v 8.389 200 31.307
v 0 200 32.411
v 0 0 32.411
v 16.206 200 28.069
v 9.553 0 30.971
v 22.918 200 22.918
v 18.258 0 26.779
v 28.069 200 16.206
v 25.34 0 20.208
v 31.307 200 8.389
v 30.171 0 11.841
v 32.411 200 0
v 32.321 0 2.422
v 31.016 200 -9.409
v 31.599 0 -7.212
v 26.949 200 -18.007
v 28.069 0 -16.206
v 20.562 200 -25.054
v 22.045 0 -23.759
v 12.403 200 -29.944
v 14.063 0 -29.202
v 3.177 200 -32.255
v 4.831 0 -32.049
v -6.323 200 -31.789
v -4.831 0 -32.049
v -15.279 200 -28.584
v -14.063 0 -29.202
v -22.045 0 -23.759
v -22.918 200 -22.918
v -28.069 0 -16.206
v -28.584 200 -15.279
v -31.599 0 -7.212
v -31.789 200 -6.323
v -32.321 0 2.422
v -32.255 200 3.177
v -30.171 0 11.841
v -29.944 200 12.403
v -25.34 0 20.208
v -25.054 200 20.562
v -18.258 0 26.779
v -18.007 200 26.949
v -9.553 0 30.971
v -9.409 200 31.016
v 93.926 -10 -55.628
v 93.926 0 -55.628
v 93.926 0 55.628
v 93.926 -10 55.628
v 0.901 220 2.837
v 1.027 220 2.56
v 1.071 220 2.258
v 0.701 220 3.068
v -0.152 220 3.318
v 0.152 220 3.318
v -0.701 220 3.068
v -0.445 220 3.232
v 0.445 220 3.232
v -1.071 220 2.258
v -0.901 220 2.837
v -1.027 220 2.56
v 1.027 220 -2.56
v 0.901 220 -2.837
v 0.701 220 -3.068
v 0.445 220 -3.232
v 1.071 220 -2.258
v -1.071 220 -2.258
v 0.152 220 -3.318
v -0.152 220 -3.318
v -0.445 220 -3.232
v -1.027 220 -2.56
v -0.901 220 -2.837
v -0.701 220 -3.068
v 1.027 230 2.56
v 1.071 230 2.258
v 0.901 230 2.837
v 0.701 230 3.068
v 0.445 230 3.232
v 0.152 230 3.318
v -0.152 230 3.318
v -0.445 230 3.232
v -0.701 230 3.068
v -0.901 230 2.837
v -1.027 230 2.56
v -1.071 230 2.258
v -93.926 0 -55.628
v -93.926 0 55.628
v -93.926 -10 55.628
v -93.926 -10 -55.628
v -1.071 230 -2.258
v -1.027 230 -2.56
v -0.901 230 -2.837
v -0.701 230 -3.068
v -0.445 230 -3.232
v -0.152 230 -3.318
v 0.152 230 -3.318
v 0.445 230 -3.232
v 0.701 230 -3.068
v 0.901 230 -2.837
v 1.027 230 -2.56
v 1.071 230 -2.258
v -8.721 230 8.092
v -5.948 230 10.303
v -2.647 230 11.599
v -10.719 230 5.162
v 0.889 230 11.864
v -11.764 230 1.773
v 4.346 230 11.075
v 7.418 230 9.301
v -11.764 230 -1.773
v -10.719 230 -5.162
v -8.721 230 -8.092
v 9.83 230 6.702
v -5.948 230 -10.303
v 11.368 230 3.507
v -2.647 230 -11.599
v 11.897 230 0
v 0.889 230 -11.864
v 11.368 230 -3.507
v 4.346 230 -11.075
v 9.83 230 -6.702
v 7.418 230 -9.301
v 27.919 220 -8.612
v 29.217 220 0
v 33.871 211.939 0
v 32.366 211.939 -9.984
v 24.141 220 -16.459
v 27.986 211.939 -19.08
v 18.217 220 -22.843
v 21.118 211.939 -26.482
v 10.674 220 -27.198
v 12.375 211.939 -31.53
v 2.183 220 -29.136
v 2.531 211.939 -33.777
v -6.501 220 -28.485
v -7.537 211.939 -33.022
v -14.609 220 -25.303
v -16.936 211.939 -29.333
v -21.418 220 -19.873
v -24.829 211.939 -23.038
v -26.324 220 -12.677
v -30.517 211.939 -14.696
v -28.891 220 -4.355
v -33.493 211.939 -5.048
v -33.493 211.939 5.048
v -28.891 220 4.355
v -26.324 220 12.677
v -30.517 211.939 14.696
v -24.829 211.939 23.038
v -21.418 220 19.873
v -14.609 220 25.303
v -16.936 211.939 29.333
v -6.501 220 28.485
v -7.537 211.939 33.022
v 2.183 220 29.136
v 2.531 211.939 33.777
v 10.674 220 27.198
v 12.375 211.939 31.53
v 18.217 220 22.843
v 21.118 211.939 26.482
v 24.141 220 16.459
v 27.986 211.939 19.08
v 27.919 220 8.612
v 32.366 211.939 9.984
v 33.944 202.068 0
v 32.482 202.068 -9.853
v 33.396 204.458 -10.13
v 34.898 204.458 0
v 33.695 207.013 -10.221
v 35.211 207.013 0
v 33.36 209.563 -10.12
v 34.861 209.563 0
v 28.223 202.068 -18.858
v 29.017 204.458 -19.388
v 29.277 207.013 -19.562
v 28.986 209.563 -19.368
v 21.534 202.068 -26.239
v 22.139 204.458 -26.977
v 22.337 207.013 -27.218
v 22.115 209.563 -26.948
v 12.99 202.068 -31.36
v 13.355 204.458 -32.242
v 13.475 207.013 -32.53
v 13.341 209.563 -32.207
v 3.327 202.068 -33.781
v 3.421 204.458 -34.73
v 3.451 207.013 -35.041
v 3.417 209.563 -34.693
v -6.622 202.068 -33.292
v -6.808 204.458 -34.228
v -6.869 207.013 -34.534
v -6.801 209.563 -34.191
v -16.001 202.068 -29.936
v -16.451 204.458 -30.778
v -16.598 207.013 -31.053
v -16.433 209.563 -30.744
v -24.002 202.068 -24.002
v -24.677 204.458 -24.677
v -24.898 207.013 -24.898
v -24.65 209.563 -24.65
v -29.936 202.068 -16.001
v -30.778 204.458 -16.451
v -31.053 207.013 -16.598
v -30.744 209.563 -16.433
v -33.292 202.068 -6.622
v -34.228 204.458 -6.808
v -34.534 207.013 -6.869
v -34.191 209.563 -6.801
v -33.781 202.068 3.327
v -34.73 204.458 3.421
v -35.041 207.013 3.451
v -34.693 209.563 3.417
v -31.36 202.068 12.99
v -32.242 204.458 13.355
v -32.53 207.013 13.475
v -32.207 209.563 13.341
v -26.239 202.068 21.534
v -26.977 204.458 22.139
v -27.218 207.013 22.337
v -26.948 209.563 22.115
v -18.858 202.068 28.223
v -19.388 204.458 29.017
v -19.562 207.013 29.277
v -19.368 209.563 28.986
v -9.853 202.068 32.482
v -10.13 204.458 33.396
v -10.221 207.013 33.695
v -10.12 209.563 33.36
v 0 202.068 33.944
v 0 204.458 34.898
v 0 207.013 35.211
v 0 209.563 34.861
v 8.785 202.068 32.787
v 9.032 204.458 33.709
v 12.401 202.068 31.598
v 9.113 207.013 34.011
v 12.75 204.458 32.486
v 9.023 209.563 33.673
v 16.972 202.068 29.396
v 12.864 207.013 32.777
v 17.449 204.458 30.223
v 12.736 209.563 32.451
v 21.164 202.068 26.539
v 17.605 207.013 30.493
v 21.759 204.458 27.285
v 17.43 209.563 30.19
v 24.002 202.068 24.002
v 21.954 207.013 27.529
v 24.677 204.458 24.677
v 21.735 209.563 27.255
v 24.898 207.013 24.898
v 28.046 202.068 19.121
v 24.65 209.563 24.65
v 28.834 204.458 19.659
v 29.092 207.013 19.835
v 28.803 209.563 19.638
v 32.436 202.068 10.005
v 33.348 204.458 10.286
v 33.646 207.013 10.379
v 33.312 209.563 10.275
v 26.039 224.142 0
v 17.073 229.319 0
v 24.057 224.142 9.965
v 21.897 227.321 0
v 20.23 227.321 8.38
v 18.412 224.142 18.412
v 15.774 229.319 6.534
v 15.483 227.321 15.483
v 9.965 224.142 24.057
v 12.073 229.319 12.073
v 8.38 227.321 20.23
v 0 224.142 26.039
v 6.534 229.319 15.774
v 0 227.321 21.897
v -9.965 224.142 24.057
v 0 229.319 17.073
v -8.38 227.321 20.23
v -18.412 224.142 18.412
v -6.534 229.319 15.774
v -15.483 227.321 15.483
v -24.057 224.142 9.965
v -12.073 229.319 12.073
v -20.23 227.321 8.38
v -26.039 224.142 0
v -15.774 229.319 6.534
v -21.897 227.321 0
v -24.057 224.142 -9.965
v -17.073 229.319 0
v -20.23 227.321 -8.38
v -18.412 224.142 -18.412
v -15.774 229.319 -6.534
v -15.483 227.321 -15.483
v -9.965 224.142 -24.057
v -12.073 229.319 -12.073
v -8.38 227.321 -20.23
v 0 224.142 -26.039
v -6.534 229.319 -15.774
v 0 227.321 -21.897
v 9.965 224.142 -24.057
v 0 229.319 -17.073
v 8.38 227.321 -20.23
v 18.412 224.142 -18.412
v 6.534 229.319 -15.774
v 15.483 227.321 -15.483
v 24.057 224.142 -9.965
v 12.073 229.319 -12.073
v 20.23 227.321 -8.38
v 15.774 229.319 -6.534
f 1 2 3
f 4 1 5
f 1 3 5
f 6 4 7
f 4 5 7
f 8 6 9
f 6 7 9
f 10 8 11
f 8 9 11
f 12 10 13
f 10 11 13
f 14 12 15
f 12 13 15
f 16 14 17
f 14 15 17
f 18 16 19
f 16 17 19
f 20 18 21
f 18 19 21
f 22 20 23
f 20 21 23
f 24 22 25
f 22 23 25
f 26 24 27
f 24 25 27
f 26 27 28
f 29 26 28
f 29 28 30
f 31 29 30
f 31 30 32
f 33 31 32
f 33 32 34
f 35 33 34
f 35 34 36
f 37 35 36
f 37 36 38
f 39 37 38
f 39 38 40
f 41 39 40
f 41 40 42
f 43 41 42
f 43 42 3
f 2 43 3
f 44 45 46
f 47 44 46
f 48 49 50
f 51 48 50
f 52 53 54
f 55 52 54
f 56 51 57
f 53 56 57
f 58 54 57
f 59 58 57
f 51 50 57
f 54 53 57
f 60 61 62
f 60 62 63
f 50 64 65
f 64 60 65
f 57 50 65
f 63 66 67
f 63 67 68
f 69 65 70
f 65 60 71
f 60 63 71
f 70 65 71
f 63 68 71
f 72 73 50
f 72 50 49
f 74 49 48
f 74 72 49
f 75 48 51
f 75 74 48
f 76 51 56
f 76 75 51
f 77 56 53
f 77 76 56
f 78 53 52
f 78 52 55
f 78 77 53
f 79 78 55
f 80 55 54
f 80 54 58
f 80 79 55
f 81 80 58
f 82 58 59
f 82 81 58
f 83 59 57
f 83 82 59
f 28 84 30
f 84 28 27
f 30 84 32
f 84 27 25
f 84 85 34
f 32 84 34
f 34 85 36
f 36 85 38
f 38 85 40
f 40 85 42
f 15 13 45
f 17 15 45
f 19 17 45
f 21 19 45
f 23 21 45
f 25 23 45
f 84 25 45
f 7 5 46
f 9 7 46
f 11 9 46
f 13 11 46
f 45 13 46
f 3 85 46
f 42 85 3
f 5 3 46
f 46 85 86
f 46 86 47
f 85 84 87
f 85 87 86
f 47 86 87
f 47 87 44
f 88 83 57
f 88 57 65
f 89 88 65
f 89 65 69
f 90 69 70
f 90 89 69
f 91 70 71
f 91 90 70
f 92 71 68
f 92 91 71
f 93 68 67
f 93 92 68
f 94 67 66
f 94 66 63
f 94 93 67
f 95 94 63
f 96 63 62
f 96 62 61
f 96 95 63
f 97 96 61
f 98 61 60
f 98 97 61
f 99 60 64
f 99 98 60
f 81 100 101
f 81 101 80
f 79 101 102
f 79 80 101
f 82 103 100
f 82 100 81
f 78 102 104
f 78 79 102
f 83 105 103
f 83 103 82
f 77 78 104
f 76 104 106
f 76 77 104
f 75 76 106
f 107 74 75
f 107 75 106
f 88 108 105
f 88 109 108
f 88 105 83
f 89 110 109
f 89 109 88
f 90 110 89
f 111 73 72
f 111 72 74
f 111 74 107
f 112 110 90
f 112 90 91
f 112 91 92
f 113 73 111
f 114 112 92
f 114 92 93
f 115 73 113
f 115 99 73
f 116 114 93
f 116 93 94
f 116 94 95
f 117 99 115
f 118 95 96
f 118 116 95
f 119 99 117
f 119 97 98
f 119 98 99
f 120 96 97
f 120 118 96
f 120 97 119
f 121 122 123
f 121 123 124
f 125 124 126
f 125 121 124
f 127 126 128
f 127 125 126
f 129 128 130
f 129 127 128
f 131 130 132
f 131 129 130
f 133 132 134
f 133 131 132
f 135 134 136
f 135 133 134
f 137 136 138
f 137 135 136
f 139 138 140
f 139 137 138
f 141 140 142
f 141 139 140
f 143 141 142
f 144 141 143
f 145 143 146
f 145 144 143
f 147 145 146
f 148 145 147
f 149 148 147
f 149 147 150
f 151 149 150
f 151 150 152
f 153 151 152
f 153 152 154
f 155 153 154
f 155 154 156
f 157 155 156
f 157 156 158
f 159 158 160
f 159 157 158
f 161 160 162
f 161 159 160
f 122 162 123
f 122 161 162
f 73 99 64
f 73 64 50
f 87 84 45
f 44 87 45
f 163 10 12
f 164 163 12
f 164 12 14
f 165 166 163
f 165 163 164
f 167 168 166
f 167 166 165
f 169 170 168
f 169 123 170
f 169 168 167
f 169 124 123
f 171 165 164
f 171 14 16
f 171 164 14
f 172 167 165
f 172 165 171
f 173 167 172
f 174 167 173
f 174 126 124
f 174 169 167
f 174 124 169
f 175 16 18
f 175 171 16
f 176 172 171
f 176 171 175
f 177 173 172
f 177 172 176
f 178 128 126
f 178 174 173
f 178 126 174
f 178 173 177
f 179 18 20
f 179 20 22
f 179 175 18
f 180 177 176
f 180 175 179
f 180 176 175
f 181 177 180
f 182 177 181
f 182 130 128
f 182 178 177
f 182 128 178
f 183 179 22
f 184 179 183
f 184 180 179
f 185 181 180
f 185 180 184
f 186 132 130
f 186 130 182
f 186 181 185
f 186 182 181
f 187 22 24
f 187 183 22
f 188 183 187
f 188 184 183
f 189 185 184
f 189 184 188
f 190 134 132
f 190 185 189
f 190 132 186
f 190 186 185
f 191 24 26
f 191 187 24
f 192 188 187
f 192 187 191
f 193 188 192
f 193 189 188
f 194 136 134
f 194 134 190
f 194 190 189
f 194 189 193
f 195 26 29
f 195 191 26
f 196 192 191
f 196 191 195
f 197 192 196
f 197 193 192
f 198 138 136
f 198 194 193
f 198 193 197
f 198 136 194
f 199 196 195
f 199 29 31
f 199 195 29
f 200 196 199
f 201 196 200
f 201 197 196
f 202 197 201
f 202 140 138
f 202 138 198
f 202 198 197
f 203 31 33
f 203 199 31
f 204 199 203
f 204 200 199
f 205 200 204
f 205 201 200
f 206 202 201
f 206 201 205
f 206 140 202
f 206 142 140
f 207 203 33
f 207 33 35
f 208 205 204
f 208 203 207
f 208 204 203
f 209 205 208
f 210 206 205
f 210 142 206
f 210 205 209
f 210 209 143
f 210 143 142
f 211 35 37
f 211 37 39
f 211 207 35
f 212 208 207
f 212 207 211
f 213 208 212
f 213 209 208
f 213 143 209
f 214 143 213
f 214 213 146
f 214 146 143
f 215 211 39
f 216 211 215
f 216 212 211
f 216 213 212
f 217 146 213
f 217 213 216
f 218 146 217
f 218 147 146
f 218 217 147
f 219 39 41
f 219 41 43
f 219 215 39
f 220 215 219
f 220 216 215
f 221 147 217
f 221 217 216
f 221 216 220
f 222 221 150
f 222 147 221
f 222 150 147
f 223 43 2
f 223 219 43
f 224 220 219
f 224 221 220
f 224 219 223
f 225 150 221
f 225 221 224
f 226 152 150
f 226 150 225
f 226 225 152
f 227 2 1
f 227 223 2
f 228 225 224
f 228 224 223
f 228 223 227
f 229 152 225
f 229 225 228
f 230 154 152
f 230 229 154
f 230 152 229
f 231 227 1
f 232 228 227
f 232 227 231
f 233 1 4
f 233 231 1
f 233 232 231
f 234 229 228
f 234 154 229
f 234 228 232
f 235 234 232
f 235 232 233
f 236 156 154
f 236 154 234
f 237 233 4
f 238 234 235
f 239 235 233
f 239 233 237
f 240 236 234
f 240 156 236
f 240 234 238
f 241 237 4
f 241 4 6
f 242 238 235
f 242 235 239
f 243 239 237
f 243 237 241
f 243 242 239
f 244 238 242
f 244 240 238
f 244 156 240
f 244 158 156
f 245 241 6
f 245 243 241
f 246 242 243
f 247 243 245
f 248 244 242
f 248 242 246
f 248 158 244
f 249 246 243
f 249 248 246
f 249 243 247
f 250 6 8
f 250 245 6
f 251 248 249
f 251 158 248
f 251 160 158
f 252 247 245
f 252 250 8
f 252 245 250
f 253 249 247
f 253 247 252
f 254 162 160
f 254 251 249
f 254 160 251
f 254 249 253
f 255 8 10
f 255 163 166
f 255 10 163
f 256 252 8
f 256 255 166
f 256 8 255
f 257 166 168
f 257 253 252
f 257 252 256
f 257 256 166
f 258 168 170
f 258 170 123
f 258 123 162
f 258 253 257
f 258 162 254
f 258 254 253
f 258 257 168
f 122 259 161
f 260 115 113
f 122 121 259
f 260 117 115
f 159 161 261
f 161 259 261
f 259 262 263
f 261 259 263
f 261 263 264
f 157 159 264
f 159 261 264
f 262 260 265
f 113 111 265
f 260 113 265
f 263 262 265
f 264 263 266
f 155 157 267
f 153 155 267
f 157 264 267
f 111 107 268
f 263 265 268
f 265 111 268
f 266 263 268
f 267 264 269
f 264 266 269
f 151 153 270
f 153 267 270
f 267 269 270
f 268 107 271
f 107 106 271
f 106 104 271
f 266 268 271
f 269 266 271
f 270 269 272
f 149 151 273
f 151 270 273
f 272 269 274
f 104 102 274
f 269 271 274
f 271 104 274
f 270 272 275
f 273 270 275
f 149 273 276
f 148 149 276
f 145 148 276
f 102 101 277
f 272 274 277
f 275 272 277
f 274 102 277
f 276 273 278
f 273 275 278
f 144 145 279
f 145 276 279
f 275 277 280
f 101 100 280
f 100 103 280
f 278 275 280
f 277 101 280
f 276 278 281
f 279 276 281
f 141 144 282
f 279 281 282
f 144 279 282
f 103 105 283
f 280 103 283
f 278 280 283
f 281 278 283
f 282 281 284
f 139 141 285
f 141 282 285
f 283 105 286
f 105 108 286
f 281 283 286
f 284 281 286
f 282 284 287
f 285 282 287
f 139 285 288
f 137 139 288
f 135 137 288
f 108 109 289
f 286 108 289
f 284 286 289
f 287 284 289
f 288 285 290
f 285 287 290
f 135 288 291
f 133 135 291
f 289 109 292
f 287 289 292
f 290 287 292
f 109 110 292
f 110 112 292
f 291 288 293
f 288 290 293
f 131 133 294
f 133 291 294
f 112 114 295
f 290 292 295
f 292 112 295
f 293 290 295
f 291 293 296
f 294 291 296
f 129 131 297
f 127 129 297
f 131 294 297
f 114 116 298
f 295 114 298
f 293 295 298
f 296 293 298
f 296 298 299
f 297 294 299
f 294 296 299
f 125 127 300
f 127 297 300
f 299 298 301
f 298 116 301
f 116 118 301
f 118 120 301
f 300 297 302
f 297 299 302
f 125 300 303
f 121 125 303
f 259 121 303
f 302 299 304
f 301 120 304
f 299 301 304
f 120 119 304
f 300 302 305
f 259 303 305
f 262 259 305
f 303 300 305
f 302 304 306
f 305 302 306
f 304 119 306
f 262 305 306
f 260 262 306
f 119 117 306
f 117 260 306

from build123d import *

# Parameters (mm, degrees)
SKETCH2_R           = 32.411320863
BOSS_EXTRUDE1_DEPTH = 200
SKETCH3_R           = 40.764441706
BOSS_EXTRUDE2_DEPTH = 30
BOSS_EXTRUDE2_TAPER = 30
FILLET1_R           = 10
FILLET2_R           = 20
CUT_EXTRUDE1_DEPTH  = 10
SKETCH5_W           = 187.852552736
SKETCH5_H           = 111.255195094
BOSS_EXTRUDE3_DEPTH = 10


with BuildPart() as part:
    # Sketch2 → Boss-Extrude1 (new body)
    with BuildSketch(Plane(origin=(0, 0, 0), x_dir=(1, 0, 0), z_dir=(0, 1, 0))):
        with Locations(Location((0, 0, 0), (0, 0, 270))):
            Circle(SKETCH2_R)
    extrude(amount=BOSS_EXTRUDE1_DEPTH)

    # Sketch3 → Boss-Extrude2 (add)
    with BuildSketch(Plane(origin=(0, 200, 0), x_dir=(1, 0, 0), z_dir=(0, 1, 0))):
        Circle(SKETCH3_R)
    extrude(amount=BOSS_EXTRUDE2_DEPTH, taper=BOSS_EXTRUDE2_TAPER)

    # Fillet1
    # the kernel refuses this fillet: 10 mm, written as the material it takes off along each edge
    with BuildSketch(Plane(origin=(0, 200, 0), x_dir=(1, 0, 0), z_dir=(0, 0, 1))) as fillet1_piece_1:
        with BuildLine():
            CenterArc((25.210979619, 6.93938657), FILLET1_R, 316.057297886, 73.942702114)
            Line((32.411320863, 0), (32.555327688, -0.138787731))
            ThreePointArc((32.555327688, -0.138787731), (36.587881285, -0.2), (40.764441706, -0.2))
            Line((40.764441706, -0.2), (40.937646787, 0.1))
            Line((40.937646787, 0.1), (34.044438737, 12.03938657))
            Line((34.044438737, 12.03938657), (33.871233656, 11.93938657))
        make_face()
    revolve(axis=Axis((0, 200, 0), (0, 1, 0)), mode=Mode.SUBTRACT)

    # Fillet2
    fillet2_edges = [part.edges().sort_by_distance(p)[0] for p in [
        (-23.443933631, 230, 0),
    ]]
    fillet(fillet2_edges, radius=FILLET2_R)

    # Sketch4 → Cut-Extrude1 (cut)
    with BuildSketch(Plane(origin=(0, 230, 0), x_dir=(1, 0, 0), z_dir=(0, 1, 0))):
        with BuildLine():
            Line((1.070724985, 2.258315279), (1.070724985, -2.258315279))
            ThreePointArc((1.070724985, -2.258315279), (0, -3.329040264), (-1.070724985, -2.258315279))
            Line((-1.070724985, -2.258315279), (-1.070724985, 2.258315279))
            ThreePointArc((-1.070724985, 2.258315279), (0, 3.329040264), (1.070724985, 2.258315279))
        make_face()
    extrude(amount=-CUT_EXTRUDE1_DEPTH, mode=Mode.SUBTRACT)

    # Sketch5 → Boss-Extrude3 (add)
    with BuildSketch(Plane.XZ):
        Rectangle(SKETCH5_W, SKETCH5_H)
    extrude(amount=BOSS_EXTRUDE3_DEPTH)


solid = part.part
